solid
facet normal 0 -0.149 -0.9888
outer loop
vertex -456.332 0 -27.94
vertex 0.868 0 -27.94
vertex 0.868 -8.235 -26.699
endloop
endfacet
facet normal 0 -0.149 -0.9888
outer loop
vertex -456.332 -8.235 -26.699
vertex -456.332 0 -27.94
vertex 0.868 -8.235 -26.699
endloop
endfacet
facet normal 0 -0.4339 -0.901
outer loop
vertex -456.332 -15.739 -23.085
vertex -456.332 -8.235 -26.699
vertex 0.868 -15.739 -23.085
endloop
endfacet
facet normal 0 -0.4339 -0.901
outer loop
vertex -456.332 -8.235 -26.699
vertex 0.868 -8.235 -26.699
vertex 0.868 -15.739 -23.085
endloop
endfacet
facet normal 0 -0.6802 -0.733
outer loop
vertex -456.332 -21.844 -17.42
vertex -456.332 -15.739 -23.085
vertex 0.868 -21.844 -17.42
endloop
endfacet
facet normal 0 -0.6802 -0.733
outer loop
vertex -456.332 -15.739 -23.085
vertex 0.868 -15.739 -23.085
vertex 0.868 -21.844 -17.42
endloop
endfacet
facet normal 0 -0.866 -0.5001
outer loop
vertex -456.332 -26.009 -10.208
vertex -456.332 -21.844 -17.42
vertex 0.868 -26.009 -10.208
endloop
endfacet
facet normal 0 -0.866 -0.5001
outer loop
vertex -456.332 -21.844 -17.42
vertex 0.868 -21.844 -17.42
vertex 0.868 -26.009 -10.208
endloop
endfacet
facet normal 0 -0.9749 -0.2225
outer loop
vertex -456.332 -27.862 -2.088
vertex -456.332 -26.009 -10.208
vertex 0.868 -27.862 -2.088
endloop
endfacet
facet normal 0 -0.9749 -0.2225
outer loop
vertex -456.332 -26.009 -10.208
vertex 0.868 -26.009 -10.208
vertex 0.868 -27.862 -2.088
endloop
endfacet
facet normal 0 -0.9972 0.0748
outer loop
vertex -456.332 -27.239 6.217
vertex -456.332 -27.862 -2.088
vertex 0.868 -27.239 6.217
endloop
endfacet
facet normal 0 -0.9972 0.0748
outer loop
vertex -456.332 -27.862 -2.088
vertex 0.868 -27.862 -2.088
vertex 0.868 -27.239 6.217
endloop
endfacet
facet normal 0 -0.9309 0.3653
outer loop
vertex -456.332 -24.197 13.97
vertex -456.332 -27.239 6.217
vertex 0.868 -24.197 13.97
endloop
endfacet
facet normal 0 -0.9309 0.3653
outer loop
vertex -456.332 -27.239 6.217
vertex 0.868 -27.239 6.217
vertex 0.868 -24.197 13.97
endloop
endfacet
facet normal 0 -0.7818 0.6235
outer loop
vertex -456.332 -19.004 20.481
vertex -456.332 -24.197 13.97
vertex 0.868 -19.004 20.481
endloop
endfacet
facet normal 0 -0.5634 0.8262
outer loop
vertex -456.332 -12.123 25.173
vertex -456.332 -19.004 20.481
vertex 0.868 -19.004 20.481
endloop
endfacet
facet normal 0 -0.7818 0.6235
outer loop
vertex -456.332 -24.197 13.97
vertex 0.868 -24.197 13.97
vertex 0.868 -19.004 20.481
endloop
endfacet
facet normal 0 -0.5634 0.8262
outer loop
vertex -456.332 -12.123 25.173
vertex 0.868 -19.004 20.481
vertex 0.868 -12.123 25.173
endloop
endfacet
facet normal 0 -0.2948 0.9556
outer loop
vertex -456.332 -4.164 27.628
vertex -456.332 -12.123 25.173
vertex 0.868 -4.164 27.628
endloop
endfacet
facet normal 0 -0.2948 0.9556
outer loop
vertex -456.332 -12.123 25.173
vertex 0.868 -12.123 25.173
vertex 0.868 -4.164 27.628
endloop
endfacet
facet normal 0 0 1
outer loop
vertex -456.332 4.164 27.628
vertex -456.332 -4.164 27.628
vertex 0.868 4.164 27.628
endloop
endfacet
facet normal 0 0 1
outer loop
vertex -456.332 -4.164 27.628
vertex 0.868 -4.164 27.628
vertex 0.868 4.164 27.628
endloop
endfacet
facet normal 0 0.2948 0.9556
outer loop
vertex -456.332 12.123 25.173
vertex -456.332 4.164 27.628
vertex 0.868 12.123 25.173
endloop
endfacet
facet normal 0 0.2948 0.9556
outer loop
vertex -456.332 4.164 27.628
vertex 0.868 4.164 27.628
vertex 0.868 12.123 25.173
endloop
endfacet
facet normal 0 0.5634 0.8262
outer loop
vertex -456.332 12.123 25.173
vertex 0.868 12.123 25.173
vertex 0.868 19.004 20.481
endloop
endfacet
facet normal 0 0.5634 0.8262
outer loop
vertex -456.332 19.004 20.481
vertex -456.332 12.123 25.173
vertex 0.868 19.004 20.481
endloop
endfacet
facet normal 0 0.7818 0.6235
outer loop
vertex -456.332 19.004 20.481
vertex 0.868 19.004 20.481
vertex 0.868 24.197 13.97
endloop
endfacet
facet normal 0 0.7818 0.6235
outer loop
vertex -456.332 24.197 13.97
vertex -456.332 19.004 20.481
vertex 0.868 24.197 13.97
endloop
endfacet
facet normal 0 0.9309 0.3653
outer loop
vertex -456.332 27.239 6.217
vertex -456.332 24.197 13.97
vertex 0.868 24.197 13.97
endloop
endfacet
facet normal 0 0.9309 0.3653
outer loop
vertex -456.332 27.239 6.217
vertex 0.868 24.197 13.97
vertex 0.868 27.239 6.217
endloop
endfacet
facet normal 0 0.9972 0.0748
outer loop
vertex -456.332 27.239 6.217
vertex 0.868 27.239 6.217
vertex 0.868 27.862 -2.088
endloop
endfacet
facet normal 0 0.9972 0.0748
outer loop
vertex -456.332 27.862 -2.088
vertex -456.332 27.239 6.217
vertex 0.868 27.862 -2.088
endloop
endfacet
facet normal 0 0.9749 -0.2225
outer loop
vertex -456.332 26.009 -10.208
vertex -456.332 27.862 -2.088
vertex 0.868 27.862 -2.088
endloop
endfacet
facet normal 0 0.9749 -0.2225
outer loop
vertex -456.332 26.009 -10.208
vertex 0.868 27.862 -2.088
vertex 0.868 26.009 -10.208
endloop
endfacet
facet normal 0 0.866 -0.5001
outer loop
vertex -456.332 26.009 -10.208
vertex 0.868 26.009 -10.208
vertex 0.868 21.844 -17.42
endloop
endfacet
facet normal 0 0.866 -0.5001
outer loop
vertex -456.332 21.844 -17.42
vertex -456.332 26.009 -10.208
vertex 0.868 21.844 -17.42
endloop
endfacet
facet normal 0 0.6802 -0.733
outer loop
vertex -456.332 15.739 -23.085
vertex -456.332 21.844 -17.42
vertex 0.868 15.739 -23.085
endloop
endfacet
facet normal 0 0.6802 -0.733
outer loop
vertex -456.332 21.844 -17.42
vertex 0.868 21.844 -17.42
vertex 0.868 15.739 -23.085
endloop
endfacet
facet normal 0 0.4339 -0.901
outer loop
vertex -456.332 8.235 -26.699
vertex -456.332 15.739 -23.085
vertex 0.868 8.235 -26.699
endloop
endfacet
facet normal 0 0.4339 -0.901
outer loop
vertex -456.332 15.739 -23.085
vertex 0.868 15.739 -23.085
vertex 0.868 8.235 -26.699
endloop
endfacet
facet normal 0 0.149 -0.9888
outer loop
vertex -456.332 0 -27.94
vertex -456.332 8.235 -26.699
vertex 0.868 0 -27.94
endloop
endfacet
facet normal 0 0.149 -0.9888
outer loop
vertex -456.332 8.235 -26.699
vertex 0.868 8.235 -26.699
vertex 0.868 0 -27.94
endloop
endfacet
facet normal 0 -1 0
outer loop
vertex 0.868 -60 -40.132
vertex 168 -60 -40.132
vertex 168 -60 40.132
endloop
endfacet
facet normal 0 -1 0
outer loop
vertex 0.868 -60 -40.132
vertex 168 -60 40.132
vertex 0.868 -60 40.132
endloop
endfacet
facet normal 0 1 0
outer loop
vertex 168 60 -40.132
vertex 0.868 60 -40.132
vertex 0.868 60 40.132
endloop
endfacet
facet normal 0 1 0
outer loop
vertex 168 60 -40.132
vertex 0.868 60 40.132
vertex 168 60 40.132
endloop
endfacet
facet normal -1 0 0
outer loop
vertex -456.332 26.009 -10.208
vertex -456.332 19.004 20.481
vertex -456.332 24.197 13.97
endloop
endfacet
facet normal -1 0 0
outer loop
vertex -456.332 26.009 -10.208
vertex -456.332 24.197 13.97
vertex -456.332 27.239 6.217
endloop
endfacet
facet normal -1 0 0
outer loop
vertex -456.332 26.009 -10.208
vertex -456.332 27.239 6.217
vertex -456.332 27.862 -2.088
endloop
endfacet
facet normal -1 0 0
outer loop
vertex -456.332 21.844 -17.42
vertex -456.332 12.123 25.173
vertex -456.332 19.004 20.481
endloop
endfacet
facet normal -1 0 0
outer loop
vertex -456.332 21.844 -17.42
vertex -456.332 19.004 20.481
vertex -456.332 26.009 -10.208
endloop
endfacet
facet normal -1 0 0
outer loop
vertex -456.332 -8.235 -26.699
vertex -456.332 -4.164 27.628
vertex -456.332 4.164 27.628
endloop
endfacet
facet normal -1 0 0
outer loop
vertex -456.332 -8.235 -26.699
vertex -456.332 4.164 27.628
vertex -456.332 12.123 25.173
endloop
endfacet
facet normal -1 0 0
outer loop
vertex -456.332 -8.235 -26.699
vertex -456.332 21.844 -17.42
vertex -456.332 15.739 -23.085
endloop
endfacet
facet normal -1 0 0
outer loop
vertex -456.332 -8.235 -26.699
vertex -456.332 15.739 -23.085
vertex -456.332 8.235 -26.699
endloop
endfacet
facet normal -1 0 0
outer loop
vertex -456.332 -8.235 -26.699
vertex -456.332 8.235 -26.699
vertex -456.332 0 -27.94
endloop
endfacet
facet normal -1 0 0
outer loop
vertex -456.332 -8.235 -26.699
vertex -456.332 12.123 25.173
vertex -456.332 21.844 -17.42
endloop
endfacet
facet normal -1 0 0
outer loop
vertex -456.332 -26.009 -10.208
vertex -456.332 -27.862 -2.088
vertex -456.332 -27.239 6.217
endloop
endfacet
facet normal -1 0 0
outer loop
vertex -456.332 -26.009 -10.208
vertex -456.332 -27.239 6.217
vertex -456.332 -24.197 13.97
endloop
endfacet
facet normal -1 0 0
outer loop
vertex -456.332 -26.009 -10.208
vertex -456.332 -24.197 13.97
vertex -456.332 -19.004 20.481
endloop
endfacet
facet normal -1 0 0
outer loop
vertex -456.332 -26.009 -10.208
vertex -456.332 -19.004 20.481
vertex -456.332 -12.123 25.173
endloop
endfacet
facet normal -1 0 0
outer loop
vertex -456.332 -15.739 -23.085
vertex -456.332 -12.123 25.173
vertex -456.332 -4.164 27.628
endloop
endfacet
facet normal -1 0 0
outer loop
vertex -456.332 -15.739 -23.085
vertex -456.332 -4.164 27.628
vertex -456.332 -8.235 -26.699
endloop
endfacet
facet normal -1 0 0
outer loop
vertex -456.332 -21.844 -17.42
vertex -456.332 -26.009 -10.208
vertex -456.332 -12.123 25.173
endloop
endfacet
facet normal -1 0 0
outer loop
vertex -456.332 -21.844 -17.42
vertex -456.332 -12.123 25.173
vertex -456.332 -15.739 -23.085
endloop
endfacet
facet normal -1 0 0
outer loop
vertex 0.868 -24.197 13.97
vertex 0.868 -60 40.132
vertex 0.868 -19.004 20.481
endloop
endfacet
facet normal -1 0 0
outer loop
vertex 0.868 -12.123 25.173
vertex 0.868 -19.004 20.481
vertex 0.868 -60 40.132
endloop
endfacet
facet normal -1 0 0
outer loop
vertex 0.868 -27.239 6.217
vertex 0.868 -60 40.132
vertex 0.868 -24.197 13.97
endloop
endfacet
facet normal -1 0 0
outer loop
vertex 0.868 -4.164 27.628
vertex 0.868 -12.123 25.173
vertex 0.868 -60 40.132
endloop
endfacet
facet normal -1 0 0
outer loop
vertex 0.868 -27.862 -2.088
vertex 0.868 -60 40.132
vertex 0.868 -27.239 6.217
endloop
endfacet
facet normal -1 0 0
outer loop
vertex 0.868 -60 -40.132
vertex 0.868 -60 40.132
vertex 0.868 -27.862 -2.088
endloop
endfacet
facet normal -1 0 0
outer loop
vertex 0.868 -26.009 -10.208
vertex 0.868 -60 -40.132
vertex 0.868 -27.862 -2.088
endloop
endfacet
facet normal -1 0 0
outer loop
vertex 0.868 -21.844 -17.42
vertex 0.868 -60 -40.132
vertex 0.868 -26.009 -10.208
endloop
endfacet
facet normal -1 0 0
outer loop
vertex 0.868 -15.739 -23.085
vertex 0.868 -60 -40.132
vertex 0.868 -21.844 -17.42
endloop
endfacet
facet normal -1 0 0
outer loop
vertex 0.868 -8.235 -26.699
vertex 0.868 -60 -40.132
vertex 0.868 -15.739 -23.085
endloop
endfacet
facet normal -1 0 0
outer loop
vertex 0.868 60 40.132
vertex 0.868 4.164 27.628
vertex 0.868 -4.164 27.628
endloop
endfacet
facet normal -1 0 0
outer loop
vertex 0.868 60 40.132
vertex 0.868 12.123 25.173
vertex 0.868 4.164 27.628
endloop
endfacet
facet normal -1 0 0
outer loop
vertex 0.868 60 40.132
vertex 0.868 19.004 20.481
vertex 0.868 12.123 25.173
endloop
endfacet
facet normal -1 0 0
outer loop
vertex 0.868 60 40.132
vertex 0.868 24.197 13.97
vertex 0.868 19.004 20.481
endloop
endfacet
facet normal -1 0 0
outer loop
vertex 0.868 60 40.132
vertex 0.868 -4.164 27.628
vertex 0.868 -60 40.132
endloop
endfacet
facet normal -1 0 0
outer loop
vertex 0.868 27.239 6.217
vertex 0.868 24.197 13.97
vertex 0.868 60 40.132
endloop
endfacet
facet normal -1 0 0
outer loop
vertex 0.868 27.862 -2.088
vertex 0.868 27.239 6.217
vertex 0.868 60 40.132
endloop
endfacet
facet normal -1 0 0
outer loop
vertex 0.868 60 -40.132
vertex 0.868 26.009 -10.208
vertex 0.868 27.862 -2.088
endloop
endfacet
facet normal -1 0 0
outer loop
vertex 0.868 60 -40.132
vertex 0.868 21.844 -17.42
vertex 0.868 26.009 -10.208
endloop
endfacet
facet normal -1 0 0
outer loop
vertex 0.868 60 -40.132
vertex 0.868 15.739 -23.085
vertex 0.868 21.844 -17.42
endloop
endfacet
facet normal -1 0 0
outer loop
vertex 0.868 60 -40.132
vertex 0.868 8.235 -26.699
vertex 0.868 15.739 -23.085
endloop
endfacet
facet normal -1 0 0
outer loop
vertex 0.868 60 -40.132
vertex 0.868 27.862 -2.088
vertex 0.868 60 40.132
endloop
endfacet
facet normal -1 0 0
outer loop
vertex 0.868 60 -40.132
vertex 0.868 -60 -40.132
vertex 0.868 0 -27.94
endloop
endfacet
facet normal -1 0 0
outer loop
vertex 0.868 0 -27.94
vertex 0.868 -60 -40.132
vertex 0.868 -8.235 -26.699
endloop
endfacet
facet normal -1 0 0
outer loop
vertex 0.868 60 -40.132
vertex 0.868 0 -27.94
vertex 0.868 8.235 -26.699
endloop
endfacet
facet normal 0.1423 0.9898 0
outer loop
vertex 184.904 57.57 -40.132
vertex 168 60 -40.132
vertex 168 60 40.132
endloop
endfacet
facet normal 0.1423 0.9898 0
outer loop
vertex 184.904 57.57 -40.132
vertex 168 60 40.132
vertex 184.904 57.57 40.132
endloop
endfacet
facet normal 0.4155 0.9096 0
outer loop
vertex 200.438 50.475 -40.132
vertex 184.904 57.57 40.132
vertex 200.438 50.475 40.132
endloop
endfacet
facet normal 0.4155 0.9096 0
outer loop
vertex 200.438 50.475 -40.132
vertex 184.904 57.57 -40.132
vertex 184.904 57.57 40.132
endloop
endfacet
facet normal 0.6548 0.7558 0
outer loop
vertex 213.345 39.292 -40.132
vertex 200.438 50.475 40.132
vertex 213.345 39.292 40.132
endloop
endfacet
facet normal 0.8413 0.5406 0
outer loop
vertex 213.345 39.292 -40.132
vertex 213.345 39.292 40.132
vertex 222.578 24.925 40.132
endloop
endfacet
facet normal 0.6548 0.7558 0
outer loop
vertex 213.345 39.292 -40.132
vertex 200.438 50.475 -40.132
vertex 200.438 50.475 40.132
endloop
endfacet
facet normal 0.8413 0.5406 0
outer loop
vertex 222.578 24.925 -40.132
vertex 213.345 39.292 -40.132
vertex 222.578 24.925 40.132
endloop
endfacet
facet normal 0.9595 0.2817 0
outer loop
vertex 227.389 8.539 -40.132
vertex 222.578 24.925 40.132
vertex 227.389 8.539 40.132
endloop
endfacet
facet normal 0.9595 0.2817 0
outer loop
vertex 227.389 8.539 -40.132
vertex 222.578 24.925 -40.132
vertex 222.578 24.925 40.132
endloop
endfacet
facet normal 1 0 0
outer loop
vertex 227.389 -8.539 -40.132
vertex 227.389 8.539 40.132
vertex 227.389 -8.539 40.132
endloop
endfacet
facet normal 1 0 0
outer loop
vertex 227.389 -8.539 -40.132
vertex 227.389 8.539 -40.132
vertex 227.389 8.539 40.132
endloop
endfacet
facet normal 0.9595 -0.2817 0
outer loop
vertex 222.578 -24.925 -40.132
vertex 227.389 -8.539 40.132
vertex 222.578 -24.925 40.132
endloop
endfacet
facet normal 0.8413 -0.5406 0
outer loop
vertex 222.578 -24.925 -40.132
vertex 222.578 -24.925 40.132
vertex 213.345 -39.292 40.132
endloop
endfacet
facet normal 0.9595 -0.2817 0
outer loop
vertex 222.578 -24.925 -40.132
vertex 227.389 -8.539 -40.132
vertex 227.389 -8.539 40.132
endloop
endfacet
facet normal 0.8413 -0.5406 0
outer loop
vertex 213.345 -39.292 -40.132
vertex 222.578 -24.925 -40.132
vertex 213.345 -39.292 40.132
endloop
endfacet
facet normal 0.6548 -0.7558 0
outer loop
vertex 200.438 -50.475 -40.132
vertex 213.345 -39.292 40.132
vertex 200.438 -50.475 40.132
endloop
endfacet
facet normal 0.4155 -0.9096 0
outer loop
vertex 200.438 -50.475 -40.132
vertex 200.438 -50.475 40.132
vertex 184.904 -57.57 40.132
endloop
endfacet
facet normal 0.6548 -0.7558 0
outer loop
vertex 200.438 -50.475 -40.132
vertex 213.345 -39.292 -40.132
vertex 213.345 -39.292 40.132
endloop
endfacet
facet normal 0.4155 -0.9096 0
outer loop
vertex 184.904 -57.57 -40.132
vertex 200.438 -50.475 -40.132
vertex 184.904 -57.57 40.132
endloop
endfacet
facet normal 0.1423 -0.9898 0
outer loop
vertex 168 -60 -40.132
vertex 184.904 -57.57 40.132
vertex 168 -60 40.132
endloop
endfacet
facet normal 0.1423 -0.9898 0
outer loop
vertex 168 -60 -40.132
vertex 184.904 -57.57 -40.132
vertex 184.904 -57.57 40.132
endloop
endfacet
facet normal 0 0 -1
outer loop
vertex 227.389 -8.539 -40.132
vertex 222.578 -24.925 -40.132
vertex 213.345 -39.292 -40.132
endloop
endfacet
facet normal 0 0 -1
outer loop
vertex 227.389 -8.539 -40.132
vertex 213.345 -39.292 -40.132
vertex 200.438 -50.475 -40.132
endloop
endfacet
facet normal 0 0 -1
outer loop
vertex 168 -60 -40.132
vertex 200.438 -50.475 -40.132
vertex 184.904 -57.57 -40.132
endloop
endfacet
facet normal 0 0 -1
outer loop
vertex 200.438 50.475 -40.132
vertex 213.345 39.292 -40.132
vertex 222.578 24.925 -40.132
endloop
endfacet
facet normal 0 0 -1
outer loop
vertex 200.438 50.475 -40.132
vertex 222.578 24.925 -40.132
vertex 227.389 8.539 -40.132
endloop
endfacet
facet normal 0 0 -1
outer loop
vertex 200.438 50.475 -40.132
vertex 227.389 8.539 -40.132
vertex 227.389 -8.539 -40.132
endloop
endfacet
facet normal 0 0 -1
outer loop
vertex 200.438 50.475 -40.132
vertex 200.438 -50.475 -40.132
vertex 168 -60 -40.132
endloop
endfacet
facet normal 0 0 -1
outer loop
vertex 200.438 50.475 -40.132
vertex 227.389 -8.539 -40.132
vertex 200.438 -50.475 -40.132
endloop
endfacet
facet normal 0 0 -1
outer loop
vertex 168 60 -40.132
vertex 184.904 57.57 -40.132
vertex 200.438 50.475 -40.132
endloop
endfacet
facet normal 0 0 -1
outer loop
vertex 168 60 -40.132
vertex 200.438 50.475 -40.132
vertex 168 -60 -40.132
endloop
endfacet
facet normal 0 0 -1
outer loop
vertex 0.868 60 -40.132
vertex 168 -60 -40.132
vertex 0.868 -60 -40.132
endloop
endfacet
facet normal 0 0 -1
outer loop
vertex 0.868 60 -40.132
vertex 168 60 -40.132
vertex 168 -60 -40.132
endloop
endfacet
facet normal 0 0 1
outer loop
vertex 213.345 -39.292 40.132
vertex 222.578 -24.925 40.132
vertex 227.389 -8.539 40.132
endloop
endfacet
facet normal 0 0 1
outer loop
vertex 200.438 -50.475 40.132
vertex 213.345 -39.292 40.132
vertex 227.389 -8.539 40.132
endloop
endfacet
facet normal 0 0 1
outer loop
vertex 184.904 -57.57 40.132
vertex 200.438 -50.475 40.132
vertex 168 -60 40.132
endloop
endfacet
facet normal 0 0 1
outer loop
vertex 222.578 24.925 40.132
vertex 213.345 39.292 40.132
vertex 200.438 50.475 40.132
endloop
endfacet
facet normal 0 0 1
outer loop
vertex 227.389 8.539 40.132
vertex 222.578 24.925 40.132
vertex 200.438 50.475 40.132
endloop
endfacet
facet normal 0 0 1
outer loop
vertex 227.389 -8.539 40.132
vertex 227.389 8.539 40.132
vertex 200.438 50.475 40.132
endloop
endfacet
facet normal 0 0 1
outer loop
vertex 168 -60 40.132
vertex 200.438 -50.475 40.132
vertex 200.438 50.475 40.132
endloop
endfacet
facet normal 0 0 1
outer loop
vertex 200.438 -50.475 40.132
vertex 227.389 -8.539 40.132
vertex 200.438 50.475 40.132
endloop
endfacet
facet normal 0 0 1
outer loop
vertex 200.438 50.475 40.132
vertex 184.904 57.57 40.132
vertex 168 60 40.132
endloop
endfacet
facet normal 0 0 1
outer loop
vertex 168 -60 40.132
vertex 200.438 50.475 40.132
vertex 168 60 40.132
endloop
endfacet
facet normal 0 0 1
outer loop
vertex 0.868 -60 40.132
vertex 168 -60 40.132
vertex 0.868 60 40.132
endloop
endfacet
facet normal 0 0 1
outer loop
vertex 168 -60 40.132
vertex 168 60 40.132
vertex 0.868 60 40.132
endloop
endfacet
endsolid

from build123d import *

# Parameters (mm, degrees)
BASE_EXTRUDE_DEPTH      = 40.132
BASE_EXTRUDE_DEPTH_BACK = 40.132
SKETCH5_R               = 27.94
BOSS_EXTRUDE1_DEPTH     = 457.2


with BuildPart() as part:
    # Sketch4 → Base-Extrude (new, two sides: drawn at the far end of the back side and taken through both)
    with BuildSketch(Plane.XY.offset(-BASE_EXTRUDE_DEPTH_BACK)):
        with BuildLine():
            Line((0.868, 60), (168, 60))
            ThreePointArc((168, 60), (228, 0), (168, -60))
            Line((168, -60), (0.868, -60))
            Line((0.868, -60), (0.868, 60))
        make_face()
    extrude(amount=BASE_EXTRUDE_DEPTH + BASE_EXTRUDE_DEPTH_BACK)

    # Sketch5 → Boss-Extrude1 (add)
    with BuildSketch(Plane.ZY.offset(-0.868)):
        Circle(SKETCH5_R)
    extrude(amount=BOSS_EXTRUDE1_DEPTH)


solid = part.part
